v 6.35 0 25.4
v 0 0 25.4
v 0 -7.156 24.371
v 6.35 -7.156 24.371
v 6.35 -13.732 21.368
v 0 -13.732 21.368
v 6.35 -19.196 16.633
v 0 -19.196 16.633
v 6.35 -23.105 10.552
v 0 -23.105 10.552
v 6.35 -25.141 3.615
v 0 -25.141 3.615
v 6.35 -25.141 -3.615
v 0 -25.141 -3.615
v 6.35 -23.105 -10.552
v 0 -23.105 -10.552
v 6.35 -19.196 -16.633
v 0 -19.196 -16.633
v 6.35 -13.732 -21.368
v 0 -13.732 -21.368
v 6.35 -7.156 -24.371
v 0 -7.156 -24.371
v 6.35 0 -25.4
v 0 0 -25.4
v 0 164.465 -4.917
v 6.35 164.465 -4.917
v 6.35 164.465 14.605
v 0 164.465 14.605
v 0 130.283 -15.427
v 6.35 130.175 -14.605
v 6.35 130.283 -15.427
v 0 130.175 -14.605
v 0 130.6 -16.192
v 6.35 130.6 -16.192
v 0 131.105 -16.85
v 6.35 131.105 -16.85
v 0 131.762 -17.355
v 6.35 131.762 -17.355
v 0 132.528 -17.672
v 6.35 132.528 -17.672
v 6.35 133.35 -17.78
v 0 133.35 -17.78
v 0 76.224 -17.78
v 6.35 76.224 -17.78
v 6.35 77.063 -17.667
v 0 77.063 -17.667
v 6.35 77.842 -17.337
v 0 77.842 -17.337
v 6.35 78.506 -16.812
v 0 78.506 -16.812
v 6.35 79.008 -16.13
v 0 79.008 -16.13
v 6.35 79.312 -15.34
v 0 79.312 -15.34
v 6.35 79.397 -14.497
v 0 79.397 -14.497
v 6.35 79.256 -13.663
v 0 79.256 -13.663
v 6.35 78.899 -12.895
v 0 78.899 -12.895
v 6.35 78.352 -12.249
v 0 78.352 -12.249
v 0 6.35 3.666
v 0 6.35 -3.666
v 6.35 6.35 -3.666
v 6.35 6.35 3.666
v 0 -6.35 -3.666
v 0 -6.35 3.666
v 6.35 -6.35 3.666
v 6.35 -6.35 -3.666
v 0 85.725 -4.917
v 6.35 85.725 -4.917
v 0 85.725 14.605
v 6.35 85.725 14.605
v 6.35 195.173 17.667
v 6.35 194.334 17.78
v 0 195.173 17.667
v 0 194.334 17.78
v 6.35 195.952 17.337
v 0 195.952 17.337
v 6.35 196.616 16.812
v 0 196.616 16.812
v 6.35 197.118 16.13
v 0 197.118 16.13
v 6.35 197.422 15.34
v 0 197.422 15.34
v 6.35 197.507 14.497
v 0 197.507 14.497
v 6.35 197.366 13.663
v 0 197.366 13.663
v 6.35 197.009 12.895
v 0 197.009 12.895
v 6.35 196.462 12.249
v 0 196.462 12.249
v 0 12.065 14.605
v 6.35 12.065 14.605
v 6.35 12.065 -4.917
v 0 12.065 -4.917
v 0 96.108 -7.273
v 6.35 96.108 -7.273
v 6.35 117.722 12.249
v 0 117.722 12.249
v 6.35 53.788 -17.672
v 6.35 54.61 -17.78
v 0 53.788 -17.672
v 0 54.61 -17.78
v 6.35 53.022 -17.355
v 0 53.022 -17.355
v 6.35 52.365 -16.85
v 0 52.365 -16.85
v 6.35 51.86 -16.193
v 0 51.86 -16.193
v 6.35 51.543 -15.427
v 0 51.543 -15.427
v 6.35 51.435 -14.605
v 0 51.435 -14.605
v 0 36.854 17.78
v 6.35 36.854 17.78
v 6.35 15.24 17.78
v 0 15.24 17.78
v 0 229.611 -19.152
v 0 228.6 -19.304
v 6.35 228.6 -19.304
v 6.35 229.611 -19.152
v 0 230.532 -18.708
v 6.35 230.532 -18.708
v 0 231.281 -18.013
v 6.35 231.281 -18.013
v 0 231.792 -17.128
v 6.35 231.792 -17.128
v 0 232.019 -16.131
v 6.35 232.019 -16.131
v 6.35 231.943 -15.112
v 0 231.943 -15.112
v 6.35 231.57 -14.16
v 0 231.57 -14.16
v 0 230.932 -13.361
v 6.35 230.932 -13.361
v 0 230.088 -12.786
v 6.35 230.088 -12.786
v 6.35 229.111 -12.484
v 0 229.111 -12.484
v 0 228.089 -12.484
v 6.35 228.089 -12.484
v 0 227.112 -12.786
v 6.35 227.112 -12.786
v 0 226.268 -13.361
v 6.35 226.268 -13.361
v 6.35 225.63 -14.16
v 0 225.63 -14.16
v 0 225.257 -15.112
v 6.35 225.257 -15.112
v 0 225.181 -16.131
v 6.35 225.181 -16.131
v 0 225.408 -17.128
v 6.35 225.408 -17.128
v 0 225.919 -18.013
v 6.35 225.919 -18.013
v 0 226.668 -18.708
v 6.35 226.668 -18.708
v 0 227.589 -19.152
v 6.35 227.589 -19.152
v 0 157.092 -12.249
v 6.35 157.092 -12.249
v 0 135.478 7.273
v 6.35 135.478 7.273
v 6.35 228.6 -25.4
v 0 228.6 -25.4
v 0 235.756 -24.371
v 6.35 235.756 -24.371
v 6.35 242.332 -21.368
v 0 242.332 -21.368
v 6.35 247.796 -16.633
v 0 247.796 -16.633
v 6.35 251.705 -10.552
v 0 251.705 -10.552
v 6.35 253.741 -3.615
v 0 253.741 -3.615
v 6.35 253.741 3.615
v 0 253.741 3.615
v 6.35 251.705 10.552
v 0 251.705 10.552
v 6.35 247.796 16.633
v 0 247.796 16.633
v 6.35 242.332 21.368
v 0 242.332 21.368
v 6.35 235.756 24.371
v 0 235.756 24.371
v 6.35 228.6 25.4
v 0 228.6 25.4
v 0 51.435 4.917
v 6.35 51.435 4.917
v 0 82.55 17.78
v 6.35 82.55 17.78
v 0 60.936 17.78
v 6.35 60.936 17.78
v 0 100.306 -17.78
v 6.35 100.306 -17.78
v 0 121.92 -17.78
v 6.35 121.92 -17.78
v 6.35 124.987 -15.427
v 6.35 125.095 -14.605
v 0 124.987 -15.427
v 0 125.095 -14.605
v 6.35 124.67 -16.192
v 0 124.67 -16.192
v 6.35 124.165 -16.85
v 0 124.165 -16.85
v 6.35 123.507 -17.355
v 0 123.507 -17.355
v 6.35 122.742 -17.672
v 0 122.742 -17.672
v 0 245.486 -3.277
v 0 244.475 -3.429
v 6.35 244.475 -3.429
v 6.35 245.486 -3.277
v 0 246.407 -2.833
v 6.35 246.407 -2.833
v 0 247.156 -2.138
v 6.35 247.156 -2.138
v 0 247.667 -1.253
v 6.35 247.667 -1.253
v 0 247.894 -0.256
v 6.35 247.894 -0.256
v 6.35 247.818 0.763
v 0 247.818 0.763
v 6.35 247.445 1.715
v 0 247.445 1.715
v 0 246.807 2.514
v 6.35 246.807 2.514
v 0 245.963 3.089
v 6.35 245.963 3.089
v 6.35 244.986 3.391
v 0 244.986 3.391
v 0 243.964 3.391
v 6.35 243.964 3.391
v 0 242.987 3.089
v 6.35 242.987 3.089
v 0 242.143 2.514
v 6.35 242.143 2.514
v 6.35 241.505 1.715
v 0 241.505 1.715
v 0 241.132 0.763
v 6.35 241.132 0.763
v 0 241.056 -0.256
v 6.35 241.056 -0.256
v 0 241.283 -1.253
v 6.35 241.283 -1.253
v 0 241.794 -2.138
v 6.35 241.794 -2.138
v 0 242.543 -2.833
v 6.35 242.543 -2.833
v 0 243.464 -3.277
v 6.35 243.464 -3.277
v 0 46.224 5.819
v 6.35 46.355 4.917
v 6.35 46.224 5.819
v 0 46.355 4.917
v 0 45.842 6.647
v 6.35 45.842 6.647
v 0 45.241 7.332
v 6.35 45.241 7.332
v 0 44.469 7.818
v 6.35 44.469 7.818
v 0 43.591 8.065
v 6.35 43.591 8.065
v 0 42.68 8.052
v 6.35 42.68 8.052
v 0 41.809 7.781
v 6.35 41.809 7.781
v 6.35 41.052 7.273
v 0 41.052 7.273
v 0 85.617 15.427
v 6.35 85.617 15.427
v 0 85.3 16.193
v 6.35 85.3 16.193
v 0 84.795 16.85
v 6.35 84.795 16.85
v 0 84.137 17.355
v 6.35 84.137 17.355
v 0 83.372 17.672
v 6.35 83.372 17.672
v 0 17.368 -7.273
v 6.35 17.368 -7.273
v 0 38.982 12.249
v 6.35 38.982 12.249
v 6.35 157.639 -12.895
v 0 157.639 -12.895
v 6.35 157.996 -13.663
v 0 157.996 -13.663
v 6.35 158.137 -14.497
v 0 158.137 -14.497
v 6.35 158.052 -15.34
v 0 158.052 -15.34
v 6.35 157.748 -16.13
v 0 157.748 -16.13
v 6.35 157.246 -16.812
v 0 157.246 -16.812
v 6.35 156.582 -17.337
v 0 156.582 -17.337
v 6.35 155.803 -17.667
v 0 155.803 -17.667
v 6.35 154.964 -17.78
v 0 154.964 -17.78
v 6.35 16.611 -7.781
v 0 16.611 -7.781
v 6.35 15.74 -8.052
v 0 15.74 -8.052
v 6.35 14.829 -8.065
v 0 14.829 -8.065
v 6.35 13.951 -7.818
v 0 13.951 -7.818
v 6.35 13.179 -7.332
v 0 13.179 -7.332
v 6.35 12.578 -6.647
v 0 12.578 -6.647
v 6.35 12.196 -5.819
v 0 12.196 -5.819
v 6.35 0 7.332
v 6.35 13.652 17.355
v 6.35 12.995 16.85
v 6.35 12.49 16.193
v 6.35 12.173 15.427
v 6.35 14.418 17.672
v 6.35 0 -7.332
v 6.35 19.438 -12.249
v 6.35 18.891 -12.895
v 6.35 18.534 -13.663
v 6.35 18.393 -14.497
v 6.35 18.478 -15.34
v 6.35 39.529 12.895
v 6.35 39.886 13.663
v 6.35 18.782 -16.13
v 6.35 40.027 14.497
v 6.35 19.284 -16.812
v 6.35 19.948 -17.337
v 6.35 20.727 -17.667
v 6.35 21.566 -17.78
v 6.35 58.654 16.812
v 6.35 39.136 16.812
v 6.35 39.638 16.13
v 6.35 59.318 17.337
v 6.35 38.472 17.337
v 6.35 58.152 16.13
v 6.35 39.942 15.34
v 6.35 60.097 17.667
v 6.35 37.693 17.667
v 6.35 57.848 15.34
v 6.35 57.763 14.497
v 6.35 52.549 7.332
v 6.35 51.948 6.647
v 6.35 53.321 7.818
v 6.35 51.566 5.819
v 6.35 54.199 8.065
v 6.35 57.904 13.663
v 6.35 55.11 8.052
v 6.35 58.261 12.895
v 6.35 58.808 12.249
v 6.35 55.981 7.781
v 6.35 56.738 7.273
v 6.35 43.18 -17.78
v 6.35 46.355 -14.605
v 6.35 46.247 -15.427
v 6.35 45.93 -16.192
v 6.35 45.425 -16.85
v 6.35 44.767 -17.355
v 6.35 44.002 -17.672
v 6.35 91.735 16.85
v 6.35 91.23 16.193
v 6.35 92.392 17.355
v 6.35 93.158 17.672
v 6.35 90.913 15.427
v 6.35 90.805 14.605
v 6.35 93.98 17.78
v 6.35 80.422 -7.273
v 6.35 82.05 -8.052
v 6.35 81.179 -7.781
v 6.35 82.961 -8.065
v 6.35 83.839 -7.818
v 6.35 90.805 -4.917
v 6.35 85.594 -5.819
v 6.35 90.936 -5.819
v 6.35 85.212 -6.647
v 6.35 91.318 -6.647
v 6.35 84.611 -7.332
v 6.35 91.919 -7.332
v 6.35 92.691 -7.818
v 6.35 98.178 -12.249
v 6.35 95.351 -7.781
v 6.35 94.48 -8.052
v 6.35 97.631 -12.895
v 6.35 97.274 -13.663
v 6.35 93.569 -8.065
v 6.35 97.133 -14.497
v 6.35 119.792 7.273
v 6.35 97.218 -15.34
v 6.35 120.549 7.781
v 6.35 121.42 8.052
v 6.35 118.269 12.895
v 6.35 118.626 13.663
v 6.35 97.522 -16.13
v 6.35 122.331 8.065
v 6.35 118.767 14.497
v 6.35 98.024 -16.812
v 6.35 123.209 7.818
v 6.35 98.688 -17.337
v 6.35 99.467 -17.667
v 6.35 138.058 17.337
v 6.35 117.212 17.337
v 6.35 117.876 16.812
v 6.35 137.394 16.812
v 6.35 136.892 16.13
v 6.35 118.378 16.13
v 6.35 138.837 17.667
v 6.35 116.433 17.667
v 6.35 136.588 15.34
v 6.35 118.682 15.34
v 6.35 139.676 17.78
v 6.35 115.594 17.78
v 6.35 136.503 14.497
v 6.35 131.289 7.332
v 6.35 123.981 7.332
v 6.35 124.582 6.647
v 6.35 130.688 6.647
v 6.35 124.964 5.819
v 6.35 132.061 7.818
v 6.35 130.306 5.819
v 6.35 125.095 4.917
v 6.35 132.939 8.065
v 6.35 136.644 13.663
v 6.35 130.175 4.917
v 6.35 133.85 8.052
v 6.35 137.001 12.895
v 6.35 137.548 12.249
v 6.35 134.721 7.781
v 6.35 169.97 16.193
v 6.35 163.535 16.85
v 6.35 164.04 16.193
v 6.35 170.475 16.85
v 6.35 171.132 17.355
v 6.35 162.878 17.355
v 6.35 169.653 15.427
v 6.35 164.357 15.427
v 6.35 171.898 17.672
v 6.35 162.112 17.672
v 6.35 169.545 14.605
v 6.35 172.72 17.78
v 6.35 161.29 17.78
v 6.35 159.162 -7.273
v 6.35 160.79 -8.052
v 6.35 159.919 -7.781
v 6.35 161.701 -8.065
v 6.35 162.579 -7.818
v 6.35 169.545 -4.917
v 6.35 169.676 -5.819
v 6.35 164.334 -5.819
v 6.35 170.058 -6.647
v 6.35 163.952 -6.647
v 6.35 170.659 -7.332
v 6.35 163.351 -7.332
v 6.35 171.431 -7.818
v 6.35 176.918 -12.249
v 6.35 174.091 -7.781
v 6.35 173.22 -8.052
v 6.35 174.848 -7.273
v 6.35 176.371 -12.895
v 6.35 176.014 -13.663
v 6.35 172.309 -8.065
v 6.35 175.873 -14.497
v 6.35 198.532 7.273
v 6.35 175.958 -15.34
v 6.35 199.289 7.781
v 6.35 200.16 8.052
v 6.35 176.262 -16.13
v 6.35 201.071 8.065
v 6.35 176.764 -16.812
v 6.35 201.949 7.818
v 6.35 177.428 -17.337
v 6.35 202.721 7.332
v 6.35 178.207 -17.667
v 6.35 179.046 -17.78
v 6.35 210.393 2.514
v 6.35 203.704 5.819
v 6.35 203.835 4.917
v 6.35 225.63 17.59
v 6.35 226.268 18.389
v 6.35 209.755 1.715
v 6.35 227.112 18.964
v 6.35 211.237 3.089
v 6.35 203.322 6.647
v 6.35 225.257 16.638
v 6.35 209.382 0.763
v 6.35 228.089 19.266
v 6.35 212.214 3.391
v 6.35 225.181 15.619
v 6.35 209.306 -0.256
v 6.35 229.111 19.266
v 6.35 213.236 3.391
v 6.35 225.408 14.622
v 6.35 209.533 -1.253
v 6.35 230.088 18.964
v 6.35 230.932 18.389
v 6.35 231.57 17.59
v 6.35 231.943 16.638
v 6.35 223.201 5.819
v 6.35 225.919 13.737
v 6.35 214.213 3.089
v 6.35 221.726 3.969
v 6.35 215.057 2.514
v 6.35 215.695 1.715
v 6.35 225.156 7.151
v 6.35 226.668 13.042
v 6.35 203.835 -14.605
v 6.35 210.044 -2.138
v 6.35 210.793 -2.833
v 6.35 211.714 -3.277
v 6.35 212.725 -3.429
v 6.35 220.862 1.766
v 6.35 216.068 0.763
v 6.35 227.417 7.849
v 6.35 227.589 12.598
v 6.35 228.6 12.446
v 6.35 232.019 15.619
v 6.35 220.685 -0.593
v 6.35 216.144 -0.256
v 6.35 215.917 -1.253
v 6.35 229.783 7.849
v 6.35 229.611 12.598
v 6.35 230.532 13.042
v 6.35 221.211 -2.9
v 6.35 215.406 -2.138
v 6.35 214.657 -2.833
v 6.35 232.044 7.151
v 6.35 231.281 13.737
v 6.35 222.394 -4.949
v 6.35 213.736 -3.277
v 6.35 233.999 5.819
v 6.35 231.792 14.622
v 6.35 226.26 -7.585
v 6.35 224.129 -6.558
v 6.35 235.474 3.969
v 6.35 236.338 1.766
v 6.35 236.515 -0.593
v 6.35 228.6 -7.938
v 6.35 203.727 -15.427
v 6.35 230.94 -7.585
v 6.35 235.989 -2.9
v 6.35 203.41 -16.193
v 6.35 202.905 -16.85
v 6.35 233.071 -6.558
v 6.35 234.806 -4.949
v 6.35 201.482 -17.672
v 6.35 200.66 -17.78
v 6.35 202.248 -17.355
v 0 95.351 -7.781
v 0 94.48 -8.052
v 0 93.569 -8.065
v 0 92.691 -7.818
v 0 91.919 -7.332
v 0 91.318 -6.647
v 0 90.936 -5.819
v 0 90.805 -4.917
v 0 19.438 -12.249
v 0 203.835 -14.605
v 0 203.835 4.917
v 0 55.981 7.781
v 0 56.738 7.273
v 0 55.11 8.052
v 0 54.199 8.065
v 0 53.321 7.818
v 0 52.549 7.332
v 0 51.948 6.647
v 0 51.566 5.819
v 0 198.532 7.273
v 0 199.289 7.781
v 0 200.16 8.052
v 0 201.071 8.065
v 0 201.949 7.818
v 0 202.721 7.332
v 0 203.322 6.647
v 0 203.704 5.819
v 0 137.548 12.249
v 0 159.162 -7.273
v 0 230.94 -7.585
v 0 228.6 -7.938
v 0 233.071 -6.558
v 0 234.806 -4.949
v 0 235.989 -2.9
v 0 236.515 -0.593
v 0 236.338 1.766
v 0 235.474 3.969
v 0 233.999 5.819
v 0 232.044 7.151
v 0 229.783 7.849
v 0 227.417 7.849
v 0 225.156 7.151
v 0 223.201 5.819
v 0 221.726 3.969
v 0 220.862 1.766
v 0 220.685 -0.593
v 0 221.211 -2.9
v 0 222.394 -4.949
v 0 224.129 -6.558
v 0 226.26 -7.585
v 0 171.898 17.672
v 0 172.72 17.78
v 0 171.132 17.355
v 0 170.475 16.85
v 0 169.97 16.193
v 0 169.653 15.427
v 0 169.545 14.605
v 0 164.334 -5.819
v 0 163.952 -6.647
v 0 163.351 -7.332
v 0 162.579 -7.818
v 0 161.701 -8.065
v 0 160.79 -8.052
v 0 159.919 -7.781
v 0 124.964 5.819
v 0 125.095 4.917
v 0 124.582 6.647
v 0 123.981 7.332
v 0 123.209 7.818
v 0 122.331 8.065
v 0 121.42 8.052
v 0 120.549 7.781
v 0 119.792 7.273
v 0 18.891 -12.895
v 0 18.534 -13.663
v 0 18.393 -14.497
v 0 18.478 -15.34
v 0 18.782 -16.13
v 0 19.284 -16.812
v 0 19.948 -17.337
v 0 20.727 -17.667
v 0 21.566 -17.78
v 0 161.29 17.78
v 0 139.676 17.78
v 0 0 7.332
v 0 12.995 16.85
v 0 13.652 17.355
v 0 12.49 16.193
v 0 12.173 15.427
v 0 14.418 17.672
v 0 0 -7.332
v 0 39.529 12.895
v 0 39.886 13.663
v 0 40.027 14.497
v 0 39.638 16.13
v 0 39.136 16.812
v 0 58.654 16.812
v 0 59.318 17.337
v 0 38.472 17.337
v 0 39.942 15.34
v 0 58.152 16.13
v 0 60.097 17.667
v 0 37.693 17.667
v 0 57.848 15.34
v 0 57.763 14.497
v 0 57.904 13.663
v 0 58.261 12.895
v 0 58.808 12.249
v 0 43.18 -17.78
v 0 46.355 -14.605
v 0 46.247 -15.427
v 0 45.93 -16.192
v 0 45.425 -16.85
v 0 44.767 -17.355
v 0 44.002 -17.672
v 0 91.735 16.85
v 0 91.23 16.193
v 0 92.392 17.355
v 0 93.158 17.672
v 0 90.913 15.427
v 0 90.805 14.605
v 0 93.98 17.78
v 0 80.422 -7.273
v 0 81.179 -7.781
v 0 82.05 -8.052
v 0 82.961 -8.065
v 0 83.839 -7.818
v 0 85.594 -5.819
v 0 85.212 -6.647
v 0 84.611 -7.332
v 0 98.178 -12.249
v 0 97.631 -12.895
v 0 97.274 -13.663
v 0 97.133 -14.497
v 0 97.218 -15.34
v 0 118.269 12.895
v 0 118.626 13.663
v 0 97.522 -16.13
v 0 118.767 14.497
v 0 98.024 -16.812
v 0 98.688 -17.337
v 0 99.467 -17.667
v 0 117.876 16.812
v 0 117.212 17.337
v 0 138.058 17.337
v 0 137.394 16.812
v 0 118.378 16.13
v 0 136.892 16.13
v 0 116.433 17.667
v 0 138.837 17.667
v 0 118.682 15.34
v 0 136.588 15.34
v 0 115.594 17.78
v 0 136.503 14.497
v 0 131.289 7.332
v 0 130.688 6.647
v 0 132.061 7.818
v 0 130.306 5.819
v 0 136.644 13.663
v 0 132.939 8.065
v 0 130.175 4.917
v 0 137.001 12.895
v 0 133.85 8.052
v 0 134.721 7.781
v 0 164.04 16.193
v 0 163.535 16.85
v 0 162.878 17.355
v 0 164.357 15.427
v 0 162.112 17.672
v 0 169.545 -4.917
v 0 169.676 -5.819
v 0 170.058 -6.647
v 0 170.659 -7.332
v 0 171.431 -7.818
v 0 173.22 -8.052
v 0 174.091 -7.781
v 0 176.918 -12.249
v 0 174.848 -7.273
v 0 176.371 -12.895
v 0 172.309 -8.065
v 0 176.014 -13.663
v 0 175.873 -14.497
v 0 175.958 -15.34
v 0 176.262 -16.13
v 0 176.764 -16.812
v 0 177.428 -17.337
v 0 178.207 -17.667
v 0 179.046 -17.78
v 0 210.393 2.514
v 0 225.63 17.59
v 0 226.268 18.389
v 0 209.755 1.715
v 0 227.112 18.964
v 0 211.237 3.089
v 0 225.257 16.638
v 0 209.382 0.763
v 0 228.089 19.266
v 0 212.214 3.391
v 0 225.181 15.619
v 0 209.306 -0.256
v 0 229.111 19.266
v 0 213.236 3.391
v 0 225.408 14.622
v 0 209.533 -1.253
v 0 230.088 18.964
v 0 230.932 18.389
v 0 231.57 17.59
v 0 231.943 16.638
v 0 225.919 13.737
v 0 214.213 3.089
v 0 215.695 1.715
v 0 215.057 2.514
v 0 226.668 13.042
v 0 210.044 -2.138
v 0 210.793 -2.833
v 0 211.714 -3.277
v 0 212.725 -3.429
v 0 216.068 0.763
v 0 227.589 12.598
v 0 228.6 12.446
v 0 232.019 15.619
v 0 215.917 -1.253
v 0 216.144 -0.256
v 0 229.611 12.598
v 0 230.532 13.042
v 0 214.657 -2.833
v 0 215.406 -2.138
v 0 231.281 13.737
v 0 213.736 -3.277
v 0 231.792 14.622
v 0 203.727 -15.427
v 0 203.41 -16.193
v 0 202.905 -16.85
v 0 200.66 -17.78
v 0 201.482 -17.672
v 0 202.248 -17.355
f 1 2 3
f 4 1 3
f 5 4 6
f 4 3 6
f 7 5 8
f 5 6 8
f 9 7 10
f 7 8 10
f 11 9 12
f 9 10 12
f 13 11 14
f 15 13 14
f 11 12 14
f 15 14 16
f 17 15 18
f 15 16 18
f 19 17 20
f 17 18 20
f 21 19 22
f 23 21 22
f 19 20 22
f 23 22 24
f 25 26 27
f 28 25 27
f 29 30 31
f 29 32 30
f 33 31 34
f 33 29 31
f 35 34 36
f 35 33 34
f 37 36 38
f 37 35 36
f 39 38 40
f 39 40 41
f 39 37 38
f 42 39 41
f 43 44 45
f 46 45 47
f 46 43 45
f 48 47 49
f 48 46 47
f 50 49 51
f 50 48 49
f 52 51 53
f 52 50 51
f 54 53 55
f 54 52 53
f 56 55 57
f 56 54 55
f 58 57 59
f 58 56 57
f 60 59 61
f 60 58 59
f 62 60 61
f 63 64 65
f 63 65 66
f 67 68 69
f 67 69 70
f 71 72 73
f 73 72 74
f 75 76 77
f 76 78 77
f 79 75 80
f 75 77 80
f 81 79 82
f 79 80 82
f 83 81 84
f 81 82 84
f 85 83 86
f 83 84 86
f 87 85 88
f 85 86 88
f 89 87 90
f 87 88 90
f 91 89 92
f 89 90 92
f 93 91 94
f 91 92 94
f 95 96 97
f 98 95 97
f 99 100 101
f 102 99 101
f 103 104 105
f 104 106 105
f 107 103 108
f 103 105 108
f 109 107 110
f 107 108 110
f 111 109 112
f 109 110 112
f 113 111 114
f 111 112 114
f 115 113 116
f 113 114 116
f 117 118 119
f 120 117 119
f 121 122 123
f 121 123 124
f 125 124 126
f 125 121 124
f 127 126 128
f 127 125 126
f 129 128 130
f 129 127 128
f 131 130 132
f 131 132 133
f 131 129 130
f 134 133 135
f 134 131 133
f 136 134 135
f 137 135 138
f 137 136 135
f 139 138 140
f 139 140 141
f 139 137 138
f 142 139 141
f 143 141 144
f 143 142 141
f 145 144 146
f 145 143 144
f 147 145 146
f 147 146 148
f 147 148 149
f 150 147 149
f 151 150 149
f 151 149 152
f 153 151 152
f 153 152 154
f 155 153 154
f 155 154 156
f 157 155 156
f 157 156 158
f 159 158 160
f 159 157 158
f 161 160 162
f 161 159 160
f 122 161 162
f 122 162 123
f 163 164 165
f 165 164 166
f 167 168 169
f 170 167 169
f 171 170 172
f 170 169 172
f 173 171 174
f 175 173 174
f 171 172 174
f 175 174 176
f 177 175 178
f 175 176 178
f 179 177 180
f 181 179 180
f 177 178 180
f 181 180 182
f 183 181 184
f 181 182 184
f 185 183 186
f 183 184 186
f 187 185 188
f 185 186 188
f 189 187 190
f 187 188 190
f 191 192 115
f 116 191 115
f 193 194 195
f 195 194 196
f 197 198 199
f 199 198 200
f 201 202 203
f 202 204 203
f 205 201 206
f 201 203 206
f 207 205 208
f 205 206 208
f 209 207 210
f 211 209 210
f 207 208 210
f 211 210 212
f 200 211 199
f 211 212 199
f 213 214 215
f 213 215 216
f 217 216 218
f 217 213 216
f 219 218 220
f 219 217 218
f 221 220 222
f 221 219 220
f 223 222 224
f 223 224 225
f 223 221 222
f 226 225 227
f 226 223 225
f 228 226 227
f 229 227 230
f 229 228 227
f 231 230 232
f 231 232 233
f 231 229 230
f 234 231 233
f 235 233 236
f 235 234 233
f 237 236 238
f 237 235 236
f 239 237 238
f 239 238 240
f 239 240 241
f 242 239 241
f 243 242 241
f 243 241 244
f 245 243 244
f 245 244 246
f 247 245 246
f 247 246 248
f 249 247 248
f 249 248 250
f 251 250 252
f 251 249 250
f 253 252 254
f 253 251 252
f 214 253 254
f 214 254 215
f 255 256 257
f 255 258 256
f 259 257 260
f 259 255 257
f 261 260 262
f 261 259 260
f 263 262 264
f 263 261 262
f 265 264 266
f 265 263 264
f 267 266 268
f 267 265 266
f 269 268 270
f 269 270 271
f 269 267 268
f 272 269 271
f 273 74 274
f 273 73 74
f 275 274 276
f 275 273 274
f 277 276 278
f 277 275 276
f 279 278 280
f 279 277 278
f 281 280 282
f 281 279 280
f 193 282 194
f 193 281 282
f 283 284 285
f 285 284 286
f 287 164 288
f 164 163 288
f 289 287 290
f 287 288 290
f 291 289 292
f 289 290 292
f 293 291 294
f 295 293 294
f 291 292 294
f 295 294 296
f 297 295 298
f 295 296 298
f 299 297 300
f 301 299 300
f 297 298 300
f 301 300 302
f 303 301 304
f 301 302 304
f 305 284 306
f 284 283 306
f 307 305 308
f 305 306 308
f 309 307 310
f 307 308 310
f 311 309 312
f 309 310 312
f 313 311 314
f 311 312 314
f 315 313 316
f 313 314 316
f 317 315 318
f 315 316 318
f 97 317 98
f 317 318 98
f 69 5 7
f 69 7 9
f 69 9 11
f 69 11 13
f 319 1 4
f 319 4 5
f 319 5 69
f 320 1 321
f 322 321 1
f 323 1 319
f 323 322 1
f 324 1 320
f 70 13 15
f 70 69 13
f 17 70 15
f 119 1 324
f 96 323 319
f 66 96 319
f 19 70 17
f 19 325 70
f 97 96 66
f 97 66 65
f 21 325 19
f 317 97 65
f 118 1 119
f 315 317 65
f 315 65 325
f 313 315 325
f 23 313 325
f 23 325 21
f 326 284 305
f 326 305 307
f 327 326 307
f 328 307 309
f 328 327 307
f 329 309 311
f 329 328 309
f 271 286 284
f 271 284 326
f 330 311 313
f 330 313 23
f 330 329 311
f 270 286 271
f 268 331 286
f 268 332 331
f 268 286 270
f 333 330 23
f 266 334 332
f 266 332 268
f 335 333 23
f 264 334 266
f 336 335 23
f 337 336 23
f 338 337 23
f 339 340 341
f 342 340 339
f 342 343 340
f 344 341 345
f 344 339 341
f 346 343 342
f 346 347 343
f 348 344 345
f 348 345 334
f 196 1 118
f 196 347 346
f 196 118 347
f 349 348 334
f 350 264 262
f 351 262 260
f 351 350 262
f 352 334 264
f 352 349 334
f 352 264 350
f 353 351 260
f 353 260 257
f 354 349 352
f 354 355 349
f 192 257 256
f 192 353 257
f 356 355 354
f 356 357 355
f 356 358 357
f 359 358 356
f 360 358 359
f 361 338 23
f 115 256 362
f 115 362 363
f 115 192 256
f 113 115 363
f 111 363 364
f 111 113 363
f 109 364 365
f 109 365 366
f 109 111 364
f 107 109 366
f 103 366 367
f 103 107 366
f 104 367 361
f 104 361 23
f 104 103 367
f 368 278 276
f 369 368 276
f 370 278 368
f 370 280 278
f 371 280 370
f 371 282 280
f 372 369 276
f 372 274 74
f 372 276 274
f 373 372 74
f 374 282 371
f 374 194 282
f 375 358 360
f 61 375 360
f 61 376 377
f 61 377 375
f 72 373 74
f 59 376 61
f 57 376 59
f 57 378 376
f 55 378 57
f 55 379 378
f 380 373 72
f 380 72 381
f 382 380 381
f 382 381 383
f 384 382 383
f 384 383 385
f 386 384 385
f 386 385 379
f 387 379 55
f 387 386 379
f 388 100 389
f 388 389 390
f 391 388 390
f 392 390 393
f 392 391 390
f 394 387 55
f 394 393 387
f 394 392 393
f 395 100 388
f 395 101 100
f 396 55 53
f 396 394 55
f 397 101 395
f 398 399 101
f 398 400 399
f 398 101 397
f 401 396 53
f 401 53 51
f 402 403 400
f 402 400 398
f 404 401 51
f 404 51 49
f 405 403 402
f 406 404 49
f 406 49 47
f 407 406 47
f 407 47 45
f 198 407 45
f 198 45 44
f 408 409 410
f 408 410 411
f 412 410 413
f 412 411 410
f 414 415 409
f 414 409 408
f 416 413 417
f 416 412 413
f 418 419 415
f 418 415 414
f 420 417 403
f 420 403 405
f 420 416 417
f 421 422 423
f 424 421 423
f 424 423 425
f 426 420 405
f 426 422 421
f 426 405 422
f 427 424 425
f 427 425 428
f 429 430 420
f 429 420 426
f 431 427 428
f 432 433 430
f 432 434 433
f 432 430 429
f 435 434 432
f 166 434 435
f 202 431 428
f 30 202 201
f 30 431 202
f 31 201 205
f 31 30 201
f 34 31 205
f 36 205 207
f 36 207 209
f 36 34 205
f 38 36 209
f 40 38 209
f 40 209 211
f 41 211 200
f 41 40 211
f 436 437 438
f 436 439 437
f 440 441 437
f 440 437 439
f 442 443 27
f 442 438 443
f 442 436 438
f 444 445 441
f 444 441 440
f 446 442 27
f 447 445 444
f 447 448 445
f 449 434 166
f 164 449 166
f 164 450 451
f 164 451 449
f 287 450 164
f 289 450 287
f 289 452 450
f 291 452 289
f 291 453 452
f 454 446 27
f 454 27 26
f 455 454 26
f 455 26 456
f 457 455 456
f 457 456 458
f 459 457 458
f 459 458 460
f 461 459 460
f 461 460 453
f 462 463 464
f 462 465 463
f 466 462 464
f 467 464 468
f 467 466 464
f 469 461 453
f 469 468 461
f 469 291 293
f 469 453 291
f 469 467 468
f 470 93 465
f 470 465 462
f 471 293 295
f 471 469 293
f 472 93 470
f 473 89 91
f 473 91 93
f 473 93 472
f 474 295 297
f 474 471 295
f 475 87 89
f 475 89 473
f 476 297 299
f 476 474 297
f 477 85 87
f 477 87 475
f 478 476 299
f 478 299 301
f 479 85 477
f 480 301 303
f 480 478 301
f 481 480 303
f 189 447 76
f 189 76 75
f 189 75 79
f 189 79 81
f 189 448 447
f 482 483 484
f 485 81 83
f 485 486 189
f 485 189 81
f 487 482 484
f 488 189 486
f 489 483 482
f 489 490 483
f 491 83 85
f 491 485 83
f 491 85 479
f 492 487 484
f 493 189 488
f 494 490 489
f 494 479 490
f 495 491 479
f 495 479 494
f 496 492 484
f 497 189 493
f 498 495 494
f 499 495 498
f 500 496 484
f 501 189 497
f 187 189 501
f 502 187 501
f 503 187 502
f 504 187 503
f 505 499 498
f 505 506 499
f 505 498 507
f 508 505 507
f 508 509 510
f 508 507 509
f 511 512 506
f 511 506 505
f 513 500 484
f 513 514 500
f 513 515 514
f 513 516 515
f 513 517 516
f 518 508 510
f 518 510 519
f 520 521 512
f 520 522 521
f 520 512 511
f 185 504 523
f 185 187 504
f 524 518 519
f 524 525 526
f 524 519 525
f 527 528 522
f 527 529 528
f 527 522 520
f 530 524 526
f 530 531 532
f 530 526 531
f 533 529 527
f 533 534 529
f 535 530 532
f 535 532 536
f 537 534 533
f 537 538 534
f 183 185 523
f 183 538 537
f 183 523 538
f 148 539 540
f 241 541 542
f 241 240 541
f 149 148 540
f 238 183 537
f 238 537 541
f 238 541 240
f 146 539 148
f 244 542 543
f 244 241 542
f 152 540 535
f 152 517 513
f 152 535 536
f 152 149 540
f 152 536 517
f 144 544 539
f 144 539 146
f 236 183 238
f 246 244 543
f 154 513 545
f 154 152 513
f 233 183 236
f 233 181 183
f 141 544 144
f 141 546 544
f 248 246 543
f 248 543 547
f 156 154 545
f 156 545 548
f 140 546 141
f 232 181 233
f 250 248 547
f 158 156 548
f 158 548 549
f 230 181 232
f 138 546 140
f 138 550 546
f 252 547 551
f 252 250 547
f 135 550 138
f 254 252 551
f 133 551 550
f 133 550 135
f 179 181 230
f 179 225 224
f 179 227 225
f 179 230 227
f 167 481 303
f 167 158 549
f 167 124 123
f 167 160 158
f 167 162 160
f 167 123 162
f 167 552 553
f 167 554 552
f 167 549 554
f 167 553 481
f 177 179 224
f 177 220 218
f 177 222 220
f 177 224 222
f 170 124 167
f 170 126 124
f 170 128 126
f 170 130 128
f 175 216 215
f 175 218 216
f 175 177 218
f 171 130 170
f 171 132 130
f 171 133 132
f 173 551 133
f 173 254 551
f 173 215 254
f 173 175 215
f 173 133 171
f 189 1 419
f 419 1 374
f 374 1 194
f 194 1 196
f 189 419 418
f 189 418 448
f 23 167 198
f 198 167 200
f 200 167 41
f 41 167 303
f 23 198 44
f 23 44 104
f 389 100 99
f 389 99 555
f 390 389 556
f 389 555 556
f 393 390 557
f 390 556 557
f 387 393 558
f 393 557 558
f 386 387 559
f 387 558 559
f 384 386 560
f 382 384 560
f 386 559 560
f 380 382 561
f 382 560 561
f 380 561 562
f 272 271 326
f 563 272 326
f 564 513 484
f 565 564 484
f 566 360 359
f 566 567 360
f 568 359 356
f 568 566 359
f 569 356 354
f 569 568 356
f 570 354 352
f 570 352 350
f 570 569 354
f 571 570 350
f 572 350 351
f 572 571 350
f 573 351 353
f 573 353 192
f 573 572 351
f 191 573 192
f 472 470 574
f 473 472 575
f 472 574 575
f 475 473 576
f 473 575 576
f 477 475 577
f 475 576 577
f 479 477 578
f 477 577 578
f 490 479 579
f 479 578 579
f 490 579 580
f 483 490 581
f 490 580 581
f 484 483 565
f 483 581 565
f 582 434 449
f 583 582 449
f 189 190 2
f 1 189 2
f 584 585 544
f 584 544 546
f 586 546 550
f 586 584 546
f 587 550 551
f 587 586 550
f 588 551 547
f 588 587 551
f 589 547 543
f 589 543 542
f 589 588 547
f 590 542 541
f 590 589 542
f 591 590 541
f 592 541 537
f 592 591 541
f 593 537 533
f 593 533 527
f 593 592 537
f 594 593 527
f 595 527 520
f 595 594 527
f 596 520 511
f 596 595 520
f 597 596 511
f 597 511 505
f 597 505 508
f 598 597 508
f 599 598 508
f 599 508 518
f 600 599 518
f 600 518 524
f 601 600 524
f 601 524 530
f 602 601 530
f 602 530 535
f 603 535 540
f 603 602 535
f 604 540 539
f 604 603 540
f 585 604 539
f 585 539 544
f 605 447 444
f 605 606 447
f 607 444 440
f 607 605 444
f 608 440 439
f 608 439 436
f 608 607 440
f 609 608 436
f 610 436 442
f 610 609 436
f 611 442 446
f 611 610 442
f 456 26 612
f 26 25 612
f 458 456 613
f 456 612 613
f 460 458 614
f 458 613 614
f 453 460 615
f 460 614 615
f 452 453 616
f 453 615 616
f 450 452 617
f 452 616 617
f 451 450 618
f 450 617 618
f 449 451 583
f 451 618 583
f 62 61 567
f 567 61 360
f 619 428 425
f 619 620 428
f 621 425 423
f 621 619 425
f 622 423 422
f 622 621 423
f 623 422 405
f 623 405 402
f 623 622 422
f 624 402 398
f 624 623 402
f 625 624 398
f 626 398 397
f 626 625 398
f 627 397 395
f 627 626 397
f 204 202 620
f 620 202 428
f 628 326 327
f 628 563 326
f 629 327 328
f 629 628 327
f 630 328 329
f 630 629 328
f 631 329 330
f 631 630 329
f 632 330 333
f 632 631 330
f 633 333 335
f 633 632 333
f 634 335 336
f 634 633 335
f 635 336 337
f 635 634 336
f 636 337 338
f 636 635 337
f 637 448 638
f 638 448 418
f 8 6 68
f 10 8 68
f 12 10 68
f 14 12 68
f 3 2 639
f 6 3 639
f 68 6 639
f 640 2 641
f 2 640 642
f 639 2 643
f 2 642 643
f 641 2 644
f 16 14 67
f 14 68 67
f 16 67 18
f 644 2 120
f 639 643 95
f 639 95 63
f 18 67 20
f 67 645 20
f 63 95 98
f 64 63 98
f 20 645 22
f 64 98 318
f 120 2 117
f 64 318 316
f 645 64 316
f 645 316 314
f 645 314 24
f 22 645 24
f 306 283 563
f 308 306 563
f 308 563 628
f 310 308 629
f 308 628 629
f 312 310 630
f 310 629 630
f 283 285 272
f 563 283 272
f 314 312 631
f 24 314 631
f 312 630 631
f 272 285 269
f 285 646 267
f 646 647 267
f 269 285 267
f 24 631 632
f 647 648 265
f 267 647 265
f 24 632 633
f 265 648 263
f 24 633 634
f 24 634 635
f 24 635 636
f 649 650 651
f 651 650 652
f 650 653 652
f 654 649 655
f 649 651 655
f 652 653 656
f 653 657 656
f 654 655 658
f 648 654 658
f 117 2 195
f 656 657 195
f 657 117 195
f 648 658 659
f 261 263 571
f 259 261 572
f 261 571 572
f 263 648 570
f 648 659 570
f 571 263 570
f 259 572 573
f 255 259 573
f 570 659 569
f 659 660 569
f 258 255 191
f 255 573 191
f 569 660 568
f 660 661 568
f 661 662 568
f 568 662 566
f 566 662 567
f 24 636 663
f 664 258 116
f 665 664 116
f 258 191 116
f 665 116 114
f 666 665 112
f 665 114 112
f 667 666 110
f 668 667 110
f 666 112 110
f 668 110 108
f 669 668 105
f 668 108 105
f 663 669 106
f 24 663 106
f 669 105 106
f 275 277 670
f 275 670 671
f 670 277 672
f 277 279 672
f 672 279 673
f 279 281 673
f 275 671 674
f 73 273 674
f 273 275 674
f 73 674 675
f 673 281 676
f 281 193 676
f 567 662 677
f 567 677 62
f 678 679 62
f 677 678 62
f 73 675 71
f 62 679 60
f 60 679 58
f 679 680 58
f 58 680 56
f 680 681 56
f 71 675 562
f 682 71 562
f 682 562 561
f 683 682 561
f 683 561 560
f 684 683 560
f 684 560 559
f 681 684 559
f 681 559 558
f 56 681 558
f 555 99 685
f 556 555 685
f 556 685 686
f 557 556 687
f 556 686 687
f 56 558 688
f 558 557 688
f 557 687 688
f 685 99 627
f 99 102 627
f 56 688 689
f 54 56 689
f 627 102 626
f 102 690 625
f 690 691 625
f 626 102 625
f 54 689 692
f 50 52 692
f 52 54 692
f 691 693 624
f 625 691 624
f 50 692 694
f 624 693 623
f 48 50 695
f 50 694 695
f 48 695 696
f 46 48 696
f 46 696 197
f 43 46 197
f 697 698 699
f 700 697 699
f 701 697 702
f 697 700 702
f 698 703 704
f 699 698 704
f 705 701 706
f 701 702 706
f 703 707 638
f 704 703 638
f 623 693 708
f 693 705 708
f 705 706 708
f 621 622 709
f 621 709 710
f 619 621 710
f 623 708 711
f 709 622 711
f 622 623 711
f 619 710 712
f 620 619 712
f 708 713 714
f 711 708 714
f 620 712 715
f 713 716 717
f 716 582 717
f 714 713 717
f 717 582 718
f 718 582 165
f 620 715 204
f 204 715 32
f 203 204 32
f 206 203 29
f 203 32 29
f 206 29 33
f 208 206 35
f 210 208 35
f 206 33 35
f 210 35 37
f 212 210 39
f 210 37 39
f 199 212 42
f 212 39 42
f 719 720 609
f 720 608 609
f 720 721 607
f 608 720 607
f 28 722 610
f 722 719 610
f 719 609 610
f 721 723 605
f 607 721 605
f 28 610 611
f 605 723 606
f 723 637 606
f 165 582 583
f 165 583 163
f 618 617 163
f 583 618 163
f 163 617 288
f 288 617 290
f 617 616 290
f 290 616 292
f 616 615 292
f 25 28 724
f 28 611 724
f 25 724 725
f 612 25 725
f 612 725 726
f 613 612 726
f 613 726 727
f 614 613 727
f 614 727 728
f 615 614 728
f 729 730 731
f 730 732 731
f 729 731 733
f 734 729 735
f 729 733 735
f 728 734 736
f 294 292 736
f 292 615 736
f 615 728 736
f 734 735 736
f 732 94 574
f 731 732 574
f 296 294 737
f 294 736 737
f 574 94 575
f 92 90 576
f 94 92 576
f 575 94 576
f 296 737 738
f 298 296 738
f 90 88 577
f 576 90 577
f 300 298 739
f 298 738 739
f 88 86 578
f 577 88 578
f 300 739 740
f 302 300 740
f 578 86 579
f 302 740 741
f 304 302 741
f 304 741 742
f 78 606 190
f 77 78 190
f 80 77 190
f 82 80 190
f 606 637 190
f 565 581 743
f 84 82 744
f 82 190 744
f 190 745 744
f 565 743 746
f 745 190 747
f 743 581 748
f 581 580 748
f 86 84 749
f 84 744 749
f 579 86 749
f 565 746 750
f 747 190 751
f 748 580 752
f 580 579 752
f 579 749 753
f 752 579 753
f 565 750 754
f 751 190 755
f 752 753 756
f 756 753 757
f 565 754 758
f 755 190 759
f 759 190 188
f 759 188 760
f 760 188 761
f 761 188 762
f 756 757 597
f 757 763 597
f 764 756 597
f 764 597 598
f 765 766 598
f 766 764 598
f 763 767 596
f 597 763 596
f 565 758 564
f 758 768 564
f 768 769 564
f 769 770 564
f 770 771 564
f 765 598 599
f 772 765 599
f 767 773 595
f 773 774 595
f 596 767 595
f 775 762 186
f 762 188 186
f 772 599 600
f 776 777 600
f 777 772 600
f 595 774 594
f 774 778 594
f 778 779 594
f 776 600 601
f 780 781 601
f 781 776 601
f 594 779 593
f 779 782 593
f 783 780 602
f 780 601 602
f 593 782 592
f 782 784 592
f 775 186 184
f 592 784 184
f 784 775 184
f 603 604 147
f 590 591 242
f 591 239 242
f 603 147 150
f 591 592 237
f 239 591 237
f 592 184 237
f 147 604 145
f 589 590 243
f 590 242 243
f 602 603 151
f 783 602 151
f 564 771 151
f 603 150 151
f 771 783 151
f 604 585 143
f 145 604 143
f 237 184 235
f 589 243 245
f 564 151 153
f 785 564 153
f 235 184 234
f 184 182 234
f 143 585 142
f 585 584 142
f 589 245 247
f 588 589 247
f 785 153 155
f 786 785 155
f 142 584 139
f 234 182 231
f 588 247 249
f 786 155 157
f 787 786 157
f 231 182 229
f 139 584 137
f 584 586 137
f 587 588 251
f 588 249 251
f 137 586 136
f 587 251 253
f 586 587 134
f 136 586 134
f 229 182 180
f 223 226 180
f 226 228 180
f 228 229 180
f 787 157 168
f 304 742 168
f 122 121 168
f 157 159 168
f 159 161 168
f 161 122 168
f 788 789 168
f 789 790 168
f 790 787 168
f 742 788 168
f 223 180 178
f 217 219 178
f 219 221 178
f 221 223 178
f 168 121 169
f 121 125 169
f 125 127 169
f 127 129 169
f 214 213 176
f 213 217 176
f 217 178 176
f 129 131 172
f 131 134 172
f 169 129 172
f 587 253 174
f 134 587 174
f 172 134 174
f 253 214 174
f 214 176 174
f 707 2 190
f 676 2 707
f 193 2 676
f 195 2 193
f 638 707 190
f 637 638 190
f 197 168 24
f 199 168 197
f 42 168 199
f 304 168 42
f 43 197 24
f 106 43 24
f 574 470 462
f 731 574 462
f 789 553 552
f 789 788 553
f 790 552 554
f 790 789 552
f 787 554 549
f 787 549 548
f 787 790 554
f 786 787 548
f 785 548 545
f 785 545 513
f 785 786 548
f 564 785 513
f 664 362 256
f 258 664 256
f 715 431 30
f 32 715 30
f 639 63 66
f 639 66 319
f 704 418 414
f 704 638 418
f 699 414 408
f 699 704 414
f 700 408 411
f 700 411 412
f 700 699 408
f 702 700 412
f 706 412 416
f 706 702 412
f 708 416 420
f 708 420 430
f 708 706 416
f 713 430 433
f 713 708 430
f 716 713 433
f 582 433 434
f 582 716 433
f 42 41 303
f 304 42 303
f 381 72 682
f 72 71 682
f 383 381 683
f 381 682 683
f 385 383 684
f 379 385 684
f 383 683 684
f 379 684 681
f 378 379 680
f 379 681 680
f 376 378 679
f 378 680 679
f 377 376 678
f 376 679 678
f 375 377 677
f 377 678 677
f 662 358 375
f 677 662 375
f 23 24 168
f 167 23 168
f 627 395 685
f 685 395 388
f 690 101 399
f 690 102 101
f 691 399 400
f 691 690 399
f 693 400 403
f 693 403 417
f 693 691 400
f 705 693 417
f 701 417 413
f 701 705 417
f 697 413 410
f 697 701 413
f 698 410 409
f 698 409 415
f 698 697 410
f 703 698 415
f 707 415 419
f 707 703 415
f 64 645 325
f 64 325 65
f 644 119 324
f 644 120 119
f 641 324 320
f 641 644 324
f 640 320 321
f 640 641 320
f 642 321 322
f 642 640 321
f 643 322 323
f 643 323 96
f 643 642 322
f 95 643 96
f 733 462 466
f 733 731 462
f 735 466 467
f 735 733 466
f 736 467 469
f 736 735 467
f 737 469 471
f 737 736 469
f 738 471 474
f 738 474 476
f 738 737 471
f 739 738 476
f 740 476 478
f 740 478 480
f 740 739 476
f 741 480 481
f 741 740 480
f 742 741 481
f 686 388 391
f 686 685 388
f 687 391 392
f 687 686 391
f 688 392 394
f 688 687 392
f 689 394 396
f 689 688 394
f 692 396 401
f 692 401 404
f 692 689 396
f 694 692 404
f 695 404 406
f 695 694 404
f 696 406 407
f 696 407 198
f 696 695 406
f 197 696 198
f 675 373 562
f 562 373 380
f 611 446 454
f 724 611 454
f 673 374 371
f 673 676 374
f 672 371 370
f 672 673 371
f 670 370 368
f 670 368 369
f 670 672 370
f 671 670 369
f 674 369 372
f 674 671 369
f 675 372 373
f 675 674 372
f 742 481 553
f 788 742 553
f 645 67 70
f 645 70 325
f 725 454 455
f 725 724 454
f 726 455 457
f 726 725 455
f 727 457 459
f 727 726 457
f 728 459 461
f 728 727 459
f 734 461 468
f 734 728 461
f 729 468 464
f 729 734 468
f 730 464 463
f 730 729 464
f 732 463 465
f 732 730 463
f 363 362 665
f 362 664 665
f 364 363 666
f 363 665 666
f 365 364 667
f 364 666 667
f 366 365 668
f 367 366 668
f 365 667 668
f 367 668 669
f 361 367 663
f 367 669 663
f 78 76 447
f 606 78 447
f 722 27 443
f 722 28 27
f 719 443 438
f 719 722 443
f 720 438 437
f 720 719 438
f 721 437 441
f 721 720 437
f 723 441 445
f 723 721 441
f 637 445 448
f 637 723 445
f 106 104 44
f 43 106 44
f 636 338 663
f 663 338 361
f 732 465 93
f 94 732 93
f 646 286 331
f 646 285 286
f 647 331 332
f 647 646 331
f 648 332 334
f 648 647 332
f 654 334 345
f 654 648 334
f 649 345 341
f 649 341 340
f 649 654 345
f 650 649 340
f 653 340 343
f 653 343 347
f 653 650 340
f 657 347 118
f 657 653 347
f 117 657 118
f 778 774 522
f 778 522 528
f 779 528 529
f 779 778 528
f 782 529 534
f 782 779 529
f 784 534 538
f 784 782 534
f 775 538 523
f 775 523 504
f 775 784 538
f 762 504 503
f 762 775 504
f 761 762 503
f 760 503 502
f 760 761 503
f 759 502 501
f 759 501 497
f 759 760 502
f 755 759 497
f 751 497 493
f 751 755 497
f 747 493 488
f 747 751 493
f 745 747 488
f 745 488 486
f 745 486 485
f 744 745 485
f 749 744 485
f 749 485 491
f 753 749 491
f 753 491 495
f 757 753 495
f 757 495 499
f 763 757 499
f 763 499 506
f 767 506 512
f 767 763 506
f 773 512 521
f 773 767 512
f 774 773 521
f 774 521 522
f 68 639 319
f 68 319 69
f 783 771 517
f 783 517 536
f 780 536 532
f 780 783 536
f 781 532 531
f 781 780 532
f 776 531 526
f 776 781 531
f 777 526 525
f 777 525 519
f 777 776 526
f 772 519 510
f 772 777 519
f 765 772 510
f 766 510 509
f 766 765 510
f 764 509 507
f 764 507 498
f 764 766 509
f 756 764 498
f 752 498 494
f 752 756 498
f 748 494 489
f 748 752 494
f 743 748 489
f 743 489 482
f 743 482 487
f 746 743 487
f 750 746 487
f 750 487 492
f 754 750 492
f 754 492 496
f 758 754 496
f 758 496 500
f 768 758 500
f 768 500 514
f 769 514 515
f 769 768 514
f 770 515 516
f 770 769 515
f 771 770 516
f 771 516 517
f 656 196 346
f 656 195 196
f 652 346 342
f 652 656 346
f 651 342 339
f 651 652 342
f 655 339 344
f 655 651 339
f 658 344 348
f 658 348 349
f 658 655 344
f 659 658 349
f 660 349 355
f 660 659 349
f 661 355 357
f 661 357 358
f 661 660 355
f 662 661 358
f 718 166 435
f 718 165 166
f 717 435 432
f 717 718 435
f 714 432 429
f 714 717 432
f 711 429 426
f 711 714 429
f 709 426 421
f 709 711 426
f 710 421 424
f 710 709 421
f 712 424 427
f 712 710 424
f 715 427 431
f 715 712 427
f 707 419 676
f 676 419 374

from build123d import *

# Parameters (mm, degrees)
SKETCH1_R           = 7.9375
SKETCH1_R_2         = 3.429
BOSS_EXTRUDE1_DEPTH = 6.35
CUT_EXTRUDE2_DEPTH  = 7.35
FILLET2_R           = 3.175


with BuildPart() as part:
    # Sketch1 → Boss-Extrude1 (new body)
    with BuildSketch(Plane(origin=(0, 0, 0), x_dir=(0, 0, -1), z_dir=(1, 0, 0))):
        with BuildLine():
            Line((-25.4, 228.6), (-25.4, 0))
            ThreePointArc((-25.4, 0), (0, -25.4), (25.4, 0))
            Line((25.4, 0), (25.4, 228.6))
            ThreePointArc((25.4, 228.6), (0, 254), (-25.4, 228.6))
        make_face()
        with Locations((0, 228.6)):
            Circle(SKETCH1_R, mode=Mode.SUBTRACT)
        with Locations((0, 212.725)):
            Circle(SKETCH1_R_2, mode=Mode.SUBTRACT)
        with Locations((-15.875, 228.6)):
            Circle(SKETCH1_R_2, mode=Mode.SUBTRACT)
        with Locations((0, 244.475)):
            Circle(SKETCH1_R_2, mode=Mode.SUBTRACT)
        with Locations((15.875, 228.6)):
            Circle(SKETCH1_R_2, mode=Mode.SUBTRACT)
        Polygon((7.332348419, 0), (3.666174209, 6.35), (-3.666174209, 6.35), (-7.332348419, 0), (-3.666174209, -6.35), (3.666174209, -6.35), align=None, mode=Mode.SUBTRACT)
    extrude(amount=BOSS_EXTRUDE1_DEPTH)

    # Sketch3 → Cut-Extrude2 (cut, through all)
    with BuildSketch(Plane(origin=(6.35, 0, 0), x_dir=(0, 0, -1), z_dir=(1, 0, 0))):
        Polygon((-12.06309933, 203.835), (17.78, 170.794425741), (17.78, 203.835), align=None)
        Polygon((-17.78, 202.585574259), (-17.78, 169.545), (12.06309933, 169.545), align=None)
        Polygon((12.063099331, 164.465), (-17.78, 164.465), (-17.78, 131.424425736), align=None)
        Polygon((17.78, 163.215574258), (-12.063099331, 130.174999995), (17.78, 130.174999995), align=None)
        Polygon((12.063099331, 90.804999989), (-17.78, 123.845574253), (-17.78, 90.804999989), align=None)
        Polygon((17.78, 125.094999995), (-12.063099331, 125.094999995), (17.78, 92.054425731), align=None)
        Polygon((17.78, 51.434999984), (17.78, 84.475574248), (-12.063099331, 51.434999984), align=None)
        Polygon((12.063099331, 85.724999989), (-17.78, 85.724999989), (-17.78, 52.684425726), align=None)
        Polygon((17.78, 46.354999984), (-12.063099329, 46.354999984), (17.78, 13.31442574), align=None)
        Polygon((12.063099329, 12.065), (-17.78, 45.105574244), (-17.78, 12.065), align=None)
    extrude(amount=-CUT_EXTRUDE2_DEPTH, mode=Mode.SUBTRACT)

    # Fillet2
    fillet2_edges = [part.edges().sort_by_distance(p)[0] for p in [
        (3.175, 52.684425726, 17.78),
        (3.175, 85.724999989, 17.78),
        (3.175, 46.354999984, 12.063099329),
        (3.175, 46.354999984, -17.78),
        (3.175, 13.31442574, -17.78),
        (3.175, 169.545, -12.06309933),
        (3.175, 169.545, 17.78),
        (3.175, 202.585574259, 17.78),
        (3.175, 164.465, -12.063099331),
        (3.175, 131.424425736, 17.78),
        (3.175, 164.465, 17.78),
        (3.175, 130.174999995, 12.063099331),
        (3.175, 163.215574258, -17.78),
        (3.175, 130.174999995, -17.78),
        (3.175, 90.804999989, -12.063099331),
        (3.175, 90.804999989, 17.78),
        (3.175, 123.845574253, 17.78),
        (3.175, 12.065, 17.78),
        (3.175, 45.105574244, 17.78),
        (3.175, 12.065, -12.063099329),
        (3.175, 203.835, 12.06309933),
        (3.175, 203.835, -17.78),
        (3.175, 170.794425741, -17.78),
        (3.175, 125.094999995, 12.063099331),
        (3.175, 125.094999995, -17.78),
        (3.175, 92.054425731, -17.78),
        (3.175, 51.434999984, 12.063099331),
        (3.175, 84.475574248, -17.78),
        (3.175, 51.434999984, -17.78),
        (3.175, 85.724999989, -12.063099331),
    ]]
    fillet(fillet2_edges, radius=FILLET2_R)


solid = part.part
